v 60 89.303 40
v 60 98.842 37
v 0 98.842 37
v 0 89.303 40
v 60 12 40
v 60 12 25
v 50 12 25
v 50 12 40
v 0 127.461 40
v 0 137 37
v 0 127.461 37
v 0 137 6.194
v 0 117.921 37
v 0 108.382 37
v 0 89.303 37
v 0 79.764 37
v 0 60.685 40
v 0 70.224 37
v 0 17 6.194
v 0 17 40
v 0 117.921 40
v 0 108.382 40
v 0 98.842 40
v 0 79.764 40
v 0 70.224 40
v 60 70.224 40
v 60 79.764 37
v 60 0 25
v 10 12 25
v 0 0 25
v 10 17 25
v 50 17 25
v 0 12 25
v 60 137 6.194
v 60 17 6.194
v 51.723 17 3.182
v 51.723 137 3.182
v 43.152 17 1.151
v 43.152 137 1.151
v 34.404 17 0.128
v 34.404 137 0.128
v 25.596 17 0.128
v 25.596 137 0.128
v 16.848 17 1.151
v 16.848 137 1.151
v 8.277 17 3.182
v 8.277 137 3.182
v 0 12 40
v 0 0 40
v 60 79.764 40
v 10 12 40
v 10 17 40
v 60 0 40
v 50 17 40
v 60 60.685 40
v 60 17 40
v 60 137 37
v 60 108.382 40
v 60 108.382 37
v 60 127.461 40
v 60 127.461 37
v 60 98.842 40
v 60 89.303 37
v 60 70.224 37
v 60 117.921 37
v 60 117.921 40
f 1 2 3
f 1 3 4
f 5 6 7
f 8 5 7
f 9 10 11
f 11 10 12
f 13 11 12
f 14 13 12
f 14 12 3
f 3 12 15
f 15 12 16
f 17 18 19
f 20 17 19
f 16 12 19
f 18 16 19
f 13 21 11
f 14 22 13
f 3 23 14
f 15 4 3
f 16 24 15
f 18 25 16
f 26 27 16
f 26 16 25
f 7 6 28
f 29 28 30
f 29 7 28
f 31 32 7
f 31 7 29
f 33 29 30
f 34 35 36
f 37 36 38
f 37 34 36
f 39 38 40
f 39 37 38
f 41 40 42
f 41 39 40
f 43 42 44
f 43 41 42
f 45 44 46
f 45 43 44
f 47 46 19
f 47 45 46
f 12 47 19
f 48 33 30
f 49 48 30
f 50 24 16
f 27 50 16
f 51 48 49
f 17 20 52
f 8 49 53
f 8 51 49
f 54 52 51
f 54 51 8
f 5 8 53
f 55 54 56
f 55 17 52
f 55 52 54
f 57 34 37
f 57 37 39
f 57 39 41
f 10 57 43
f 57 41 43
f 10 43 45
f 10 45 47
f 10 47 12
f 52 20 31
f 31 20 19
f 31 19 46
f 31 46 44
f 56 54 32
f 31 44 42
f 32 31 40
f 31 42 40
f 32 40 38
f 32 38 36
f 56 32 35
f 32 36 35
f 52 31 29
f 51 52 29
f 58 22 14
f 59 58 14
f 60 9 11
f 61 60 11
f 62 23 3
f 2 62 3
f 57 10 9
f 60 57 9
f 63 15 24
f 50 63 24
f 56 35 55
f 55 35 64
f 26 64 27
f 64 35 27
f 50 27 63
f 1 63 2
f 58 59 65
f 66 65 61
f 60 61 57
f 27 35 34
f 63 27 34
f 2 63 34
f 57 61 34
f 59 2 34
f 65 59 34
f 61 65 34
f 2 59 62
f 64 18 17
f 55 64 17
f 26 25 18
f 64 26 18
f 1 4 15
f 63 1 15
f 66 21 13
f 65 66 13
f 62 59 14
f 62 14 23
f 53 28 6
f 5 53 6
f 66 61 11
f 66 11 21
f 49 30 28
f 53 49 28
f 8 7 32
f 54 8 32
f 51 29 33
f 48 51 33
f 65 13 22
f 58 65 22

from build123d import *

# Parameters (mm, degrees)
BOSS_EXTRUDE1_DEPTH     = 40
CUT_EXTRUDE1_DEPTH      = 155.819249449
CUT_EXTRUDE1_DEPTH_BACK = 155.819249449
CUT_EXTRUDE2_DEPTH      = 25
CUT_EXTRUDE3_DEPTH      = 155.819249449


with BuildPart() as part:
    # Sketch1 → Boss-Extrude1 (new body)
    with BuildSketch(Plane.XY):
        Polygon((0, 0), (60, 0), (60, 12), (50, 12), (50, 17), (60, 17), (60, 137), (0, 137), (0, 17), (10, 17), (10, 12), (0, 12), align=None)
    extrude(amount=BOSS_EXTRUDE1_DEPTH)

    # Sketch2 → Cut-Extrude1 (cut, two sides: drawn at the far end of the back side and taken through both)
    with BuildSketch(Plane(origin=(0, 0, 0), x_dir=(0, 0, -1), z_dir=(1, 0, 0)).offset(-CUT_EXTRUDE1_DEPTH_BACK)):
        Polygon((-40, 137), (-37, 137), (-40, 127.460607986), (-37, 127.460607986), (-40, 117.921215972), (-37, 117.921215972), (-40, 108.381823957), (-37, 108.381823957), (-40, 98.842431943), (-37, 98.842431943), (-40, 89.303039929), (-37, 89.303039929), (-40, 79.763647915), (-37, 79.763647915), (-40, 70.224255901), (-37, 70.224255901), (-40, 60.684863887), (-47.730210084, 60.684863887), (-47.730210084, 137), align=None)
    extrude(amount=CUT_EXTRUDE1_DEPTH + CUT_EXTRUDE1_DEPTH_BACK, mode=Mode.SUBTRACT)

    # Sketch3 → Cut-Extrude2 (cut)
    with BuildSketch(Plane(origin=(0, 0, 0), x_dir=(-1, 0, 0), z_dir=(0, 0, -1))):
        Polygon((-60, 0), (0, 0), (0, 12), (-10, 12), (-10, 17), (-50, 17), (-50, 12), (-60, 12), align=None)
    extrude(amount=-CUT_EXTRUDE2_DEPTH, mode=Mode.SUBTRACT)

    # Sketch4 → Cut-Extrude3 (cut, through all)
    with BuildSketch(Plane(origin=(0, 137, 0), x_dir=(1, 0, 0), z_dir=(0, 1, 0))):
        with BuildLine():
            Line((0, -6.193777394), (0, 6.02263776))
            Line((0, 6.02263776), (60, 6.02263776))
            Line((60, 6.02263776), (60, -6.193777394))
            ThreePointArc((60, -6.193777394), (30, 0), (0, -6.193777394))
        make_face()
    extrude(amount=-CUT_EXTRUDE3_DEPTH, mode=Mode.SUBTRACT)


solid = part.part
